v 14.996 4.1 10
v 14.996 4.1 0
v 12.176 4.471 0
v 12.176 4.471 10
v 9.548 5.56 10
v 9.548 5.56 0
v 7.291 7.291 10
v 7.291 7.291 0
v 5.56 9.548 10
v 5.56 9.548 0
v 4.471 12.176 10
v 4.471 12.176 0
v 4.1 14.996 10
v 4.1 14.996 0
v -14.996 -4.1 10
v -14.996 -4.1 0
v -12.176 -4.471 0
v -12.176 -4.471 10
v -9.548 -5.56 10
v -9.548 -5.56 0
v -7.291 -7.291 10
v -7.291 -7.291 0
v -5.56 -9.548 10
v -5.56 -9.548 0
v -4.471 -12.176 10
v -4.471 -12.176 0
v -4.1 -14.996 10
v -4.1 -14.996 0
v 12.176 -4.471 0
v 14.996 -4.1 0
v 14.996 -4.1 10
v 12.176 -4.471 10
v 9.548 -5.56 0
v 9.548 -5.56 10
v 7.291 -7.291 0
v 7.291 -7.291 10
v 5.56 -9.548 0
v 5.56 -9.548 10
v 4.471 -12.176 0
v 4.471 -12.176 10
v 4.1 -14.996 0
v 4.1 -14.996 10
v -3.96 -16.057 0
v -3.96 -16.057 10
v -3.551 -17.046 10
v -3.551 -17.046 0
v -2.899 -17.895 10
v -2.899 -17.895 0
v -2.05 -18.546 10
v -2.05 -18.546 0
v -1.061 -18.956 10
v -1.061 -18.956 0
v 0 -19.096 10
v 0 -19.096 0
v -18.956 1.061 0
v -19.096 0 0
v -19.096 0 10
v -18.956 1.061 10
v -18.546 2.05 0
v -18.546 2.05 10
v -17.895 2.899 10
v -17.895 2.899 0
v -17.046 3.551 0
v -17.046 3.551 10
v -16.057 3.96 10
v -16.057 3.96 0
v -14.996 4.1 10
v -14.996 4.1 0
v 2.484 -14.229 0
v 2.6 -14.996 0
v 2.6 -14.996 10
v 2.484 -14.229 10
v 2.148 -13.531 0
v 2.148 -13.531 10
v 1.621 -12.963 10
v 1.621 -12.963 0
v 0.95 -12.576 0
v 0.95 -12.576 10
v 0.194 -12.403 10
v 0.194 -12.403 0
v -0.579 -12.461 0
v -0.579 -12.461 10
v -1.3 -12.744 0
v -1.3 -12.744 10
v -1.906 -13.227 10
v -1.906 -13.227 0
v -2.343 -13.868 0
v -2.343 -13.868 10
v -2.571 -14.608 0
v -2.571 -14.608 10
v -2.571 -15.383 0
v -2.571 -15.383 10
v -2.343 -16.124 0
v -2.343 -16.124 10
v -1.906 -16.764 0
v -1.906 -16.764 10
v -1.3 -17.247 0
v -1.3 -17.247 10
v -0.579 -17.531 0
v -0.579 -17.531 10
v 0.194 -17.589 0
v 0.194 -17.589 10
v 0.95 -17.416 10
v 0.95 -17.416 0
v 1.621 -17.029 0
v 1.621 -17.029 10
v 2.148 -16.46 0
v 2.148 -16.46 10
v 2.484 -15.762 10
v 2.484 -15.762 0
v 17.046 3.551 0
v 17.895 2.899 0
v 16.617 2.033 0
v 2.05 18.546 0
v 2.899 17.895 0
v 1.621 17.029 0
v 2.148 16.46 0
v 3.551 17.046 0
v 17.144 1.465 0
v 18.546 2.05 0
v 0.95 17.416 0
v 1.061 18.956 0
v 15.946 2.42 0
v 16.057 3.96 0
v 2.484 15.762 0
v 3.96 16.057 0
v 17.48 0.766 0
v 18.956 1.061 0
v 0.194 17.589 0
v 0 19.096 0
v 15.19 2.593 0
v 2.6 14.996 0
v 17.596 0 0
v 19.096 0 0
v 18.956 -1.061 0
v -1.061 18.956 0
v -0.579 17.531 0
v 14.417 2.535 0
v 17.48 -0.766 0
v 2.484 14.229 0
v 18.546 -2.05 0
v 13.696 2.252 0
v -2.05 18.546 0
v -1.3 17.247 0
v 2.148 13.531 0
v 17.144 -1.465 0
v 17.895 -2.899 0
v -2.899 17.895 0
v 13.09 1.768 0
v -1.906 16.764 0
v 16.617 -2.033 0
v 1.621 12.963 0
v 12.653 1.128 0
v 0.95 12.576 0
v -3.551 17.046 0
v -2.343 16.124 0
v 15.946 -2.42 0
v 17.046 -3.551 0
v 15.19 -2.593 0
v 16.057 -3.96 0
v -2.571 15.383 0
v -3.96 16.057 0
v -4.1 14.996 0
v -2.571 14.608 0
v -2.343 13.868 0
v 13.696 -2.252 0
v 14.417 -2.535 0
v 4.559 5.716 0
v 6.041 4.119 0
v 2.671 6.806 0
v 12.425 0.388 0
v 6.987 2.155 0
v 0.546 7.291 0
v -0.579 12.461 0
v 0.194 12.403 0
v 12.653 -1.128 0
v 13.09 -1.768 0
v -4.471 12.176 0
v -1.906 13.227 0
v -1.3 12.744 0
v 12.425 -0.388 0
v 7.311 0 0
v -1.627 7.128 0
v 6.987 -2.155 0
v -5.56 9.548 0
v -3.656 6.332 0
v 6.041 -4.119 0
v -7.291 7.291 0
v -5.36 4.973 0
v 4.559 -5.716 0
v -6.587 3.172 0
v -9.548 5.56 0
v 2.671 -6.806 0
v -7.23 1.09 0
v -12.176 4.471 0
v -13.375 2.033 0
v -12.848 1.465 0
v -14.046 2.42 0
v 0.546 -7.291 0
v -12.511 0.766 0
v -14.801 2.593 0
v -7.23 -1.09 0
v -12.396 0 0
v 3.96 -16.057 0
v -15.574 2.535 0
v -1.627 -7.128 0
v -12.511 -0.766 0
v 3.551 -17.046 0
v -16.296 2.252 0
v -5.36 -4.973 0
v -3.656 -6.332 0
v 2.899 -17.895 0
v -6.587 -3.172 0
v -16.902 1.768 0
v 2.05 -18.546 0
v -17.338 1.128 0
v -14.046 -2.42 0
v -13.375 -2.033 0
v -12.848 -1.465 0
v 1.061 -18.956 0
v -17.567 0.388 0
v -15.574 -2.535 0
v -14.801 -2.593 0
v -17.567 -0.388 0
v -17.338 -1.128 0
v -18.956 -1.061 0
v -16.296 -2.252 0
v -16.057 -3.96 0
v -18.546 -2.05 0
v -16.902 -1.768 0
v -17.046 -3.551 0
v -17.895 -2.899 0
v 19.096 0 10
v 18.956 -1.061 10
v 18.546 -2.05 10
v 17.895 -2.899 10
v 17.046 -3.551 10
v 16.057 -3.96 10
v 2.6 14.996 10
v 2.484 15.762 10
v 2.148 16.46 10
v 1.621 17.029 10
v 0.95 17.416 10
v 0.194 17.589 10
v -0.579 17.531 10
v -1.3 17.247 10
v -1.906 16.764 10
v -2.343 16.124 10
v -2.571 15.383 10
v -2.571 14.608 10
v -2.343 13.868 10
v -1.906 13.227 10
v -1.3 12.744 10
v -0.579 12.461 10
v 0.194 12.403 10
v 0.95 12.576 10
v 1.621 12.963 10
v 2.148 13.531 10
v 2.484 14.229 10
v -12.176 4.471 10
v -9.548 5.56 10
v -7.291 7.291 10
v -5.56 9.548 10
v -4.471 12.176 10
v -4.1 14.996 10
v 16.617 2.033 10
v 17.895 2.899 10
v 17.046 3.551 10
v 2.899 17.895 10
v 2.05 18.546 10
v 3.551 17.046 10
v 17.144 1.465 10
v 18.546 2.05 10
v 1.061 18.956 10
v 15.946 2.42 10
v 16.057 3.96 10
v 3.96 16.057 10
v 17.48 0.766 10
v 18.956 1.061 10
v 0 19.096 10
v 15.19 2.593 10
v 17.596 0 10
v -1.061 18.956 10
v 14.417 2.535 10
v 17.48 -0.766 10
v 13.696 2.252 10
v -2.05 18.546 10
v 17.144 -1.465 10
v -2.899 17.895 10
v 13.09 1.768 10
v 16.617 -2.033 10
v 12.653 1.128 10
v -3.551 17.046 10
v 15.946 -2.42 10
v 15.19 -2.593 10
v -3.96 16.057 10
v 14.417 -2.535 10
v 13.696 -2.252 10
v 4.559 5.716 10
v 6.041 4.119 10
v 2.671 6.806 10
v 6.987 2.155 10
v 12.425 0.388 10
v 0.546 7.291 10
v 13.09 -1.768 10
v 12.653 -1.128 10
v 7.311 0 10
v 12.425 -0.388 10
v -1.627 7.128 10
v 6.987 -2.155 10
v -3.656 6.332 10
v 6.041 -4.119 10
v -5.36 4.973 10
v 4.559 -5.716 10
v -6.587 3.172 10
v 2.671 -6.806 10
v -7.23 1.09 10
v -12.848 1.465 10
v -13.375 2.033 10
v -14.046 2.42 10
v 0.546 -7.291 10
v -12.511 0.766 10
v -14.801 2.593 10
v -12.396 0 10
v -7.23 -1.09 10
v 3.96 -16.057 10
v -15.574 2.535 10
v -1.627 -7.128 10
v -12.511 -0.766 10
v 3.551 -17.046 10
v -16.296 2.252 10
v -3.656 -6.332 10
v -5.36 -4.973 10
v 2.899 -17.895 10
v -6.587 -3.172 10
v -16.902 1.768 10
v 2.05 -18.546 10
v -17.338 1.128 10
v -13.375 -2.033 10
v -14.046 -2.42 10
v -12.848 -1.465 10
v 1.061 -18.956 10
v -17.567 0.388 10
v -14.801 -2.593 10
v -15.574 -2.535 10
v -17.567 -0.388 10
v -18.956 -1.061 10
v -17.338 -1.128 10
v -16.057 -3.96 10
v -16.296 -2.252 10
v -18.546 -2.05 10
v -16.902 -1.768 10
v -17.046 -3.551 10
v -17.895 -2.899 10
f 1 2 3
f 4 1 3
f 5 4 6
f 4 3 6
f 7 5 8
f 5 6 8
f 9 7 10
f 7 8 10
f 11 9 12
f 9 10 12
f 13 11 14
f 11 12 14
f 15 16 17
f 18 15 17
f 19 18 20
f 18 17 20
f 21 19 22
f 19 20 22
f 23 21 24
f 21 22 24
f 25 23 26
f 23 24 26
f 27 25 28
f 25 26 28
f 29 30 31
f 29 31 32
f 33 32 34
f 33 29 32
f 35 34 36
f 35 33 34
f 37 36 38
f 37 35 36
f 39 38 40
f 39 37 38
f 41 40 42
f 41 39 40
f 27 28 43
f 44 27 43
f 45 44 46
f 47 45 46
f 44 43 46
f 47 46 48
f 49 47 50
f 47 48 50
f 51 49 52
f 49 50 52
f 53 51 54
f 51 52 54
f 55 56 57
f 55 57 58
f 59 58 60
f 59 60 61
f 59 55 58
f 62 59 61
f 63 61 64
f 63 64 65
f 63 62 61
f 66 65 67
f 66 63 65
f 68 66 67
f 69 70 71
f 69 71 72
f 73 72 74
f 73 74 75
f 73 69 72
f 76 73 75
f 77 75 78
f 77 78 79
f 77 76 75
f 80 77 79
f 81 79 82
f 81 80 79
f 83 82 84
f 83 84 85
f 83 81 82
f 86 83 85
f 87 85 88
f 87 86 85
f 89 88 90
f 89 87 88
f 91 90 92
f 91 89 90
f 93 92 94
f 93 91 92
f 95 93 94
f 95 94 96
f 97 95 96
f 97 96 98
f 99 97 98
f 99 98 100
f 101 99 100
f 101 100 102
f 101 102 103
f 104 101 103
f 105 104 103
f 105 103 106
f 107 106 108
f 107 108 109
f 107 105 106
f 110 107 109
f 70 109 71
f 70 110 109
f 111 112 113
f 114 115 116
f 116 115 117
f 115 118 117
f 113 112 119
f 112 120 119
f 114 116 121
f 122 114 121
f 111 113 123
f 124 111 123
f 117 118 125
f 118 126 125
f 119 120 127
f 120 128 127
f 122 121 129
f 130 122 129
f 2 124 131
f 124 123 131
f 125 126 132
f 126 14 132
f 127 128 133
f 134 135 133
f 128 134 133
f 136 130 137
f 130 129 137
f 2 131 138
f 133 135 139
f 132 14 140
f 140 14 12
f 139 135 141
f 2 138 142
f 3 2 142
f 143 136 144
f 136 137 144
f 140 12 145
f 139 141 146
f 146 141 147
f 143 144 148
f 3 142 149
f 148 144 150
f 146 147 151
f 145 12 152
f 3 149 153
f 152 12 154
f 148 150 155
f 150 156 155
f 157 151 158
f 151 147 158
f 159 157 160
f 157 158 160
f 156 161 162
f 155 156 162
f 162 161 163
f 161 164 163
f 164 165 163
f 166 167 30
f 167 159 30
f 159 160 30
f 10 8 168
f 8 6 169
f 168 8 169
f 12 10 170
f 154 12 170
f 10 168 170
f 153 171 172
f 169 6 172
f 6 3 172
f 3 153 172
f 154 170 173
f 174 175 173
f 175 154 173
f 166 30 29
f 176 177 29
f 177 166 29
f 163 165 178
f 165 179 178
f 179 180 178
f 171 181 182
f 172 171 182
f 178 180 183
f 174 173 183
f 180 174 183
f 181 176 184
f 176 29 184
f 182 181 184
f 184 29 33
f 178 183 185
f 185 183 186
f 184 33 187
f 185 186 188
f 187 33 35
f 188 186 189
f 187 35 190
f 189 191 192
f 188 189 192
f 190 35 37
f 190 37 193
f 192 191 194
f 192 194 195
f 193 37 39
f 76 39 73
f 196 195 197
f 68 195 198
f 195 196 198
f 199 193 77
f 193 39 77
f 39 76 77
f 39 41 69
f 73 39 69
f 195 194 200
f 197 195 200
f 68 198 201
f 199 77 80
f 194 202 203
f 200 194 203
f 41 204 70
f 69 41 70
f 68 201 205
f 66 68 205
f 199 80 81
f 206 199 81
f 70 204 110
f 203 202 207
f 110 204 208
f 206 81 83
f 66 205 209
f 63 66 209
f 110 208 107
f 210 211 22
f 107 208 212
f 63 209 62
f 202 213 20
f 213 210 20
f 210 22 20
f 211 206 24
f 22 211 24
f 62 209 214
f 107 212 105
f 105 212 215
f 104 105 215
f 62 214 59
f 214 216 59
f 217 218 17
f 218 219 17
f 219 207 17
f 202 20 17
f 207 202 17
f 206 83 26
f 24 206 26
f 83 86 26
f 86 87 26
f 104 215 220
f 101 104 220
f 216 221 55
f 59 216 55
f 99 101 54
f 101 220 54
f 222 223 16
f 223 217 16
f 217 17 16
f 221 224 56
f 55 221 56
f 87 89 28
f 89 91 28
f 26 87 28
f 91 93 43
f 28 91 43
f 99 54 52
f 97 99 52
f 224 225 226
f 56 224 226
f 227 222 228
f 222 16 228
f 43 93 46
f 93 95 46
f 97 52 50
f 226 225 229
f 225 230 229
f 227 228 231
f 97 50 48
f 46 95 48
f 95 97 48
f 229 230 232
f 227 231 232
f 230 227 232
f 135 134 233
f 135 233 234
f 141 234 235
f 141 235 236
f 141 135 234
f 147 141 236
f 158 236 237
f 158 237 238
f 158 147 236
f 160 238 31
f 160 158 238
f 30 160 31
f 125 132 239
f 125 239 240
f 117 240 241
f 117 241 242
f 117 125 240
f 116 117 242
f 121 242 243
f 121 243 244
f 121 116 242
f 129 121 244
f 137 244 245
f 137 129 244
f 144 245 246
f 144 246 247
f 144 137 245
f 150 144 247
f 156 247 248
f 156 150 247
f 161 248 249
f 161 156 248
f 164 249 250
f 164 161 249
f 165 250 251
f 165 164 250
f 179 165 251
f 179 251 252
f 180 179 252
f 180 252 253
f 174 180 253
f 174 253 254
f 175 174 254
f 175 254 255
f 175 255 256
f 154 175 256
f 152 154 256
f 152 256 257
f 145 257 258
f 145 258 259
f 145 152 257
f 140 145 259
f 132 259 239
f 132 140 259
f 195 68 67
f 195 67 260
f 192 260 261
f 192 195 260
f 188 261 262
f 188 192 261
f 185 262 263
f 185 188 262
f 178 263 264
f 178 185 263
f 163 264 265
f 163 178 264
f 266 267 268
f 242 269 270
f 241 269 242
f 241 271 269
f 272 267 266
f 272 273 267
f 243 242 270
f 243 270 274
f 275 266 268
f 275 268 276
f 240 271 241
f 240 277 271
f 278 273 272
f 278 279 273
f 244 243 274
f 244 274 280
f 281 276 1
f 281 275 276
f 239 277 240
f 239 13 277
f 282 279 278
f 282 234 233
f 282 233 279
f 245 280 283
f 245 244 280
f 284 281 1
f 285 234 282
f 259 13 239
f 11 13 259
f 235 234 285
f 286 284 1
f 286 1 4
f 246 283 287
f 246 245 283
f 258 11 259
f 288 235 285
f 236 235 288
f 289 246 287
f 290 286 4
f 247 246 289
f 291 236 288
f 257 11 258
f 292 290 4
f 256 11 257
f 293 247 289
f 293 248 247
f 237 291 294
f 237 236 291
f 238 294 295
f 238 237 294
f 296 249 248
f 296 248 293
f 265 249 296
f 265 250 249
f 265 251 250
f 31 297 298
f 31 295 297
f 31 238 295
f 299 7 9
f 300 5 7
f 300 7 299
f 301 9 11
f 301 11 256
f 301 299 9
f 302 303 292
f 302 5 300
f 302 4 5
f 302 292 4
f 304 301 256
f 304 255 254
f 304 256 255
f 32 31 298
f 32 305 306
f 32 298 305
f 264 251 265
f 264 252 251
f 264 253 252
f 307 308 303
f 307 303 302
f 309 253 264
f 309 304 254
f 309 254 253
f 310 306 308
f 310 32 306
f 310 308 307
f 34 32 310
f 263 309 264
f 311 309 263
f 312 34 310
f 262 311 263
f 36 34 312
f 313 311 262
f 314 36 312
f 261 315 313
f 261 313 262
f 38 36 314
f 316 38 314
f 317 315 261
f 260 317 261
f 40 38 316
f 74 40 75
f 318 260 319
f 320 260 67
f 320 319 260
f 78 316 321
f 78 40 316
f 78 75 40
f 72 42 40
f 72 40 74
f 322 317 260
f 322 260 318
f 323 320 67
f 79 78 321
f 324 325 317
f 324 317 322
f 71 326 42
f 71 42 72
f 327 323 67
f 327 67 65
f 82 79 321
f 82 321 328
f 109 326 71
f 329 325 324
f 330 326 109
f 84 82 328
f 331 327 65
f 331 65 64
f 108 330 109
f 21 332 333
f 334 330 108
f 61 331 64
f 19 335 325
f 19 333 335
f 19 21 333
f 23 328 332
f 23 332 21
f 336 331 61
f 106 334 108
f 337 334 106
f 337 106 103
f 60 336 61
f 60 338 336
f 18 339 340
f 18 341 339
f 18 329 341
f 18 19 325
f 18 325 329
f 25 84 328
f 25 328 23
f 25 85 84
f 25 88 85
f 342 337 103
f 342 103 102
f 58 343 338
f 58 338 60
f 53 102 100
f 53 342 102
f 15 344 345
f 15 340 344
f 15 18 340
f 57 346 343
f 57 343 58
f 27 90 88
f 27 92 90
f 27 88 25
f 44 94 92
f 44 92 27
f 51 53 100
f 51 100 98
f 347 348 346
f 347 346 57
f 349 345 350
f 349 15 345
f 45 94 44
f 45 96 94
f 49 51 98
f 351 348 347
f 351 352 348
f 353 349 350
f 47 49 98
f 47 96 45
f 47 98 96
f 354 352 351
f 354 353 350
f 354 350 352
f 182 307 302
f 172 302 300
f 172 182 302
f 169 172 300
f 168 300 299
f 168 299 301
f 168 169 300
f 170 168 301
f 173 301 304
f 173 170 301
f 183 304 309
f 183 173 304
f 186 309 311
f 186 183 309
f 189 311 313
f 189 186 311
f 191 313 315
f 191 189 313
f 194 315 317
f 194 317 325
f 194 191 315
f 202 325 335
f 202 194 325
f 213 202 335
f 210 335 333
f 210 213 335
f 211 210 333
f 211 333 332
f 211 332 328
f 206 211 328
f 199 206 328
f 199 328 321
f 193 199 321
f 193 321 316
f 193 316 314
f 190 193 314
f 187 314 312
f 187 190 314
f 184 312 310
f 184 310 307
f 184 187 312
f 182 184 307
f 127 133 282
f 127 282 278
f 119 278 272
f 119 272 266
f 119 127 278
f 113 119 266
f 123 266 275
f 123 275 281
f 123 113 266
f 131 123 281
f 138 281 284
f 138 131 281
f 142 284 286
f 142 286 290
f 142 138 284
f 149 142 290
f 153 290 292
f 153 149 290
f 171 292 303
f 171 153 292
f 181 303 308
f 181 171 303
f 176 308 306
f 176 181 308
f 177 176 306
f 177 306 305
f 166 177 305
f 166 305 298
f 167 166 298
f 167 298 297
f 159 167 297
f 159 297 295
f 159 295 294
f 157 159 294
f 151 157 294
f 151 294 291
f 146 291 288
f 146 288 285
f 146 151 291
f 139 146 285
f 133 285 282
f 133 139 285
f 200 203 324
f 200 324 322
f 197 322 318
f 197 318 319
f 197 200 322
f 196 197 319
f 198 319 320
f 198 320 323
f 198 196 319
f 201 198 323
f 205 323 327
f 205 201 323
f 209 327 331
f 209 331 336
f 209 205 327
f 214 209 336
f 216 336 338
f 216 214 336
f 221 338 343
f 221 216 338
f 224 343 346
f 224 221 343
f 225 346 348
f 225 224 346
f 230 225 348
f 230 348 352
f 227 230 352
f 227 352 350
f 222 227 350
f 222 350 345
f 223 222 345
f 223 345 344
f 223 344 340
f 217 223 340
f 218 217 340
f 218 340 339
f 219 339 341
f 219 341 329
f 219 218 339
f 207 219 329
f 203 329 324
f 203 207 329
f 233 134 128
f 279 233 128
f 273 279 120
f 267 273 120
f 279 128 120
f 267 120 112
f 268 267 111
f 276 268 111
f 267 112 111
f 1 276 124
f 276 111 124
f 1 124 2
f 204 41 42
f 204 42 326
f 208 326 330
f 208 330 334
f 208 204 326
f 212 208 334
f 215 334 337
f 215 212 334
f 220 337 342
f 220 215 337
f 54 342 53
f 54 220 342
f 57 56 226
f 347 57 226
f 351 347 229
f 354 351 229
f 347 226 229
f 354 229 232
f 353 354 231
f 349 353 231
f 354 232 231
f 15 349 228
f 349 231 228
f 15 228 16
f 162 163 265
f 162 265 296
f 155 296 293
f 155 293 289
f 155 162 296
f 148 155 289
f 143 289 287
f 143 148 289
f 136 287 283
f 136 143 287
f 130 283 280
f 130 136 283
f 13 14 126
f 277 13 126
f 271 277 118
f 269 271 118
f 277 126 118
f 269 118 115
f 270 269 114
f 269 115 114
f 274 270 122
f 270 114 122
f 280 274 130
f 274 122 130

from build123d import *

# Parameters (mm, degrees)
AUFSATZ_LINEAR_AUSTRAGEN1_DEPTH = 10
SKIZZE2_R                       = 2.6
SCHNITT_LINEAR_AUSTRAGEN2_DEPTH = 10
SKIZZE3_R                       = 7.311453451
SCHNITT_LINEAR_AUSTRAGEN4_DEPTH = 10


with BuildPart() as part:
    # Skizze1 → Aufsatz-Linear austragen1 (new body)
    with BuildSketch(Plane.XY):
        with BuildLine():
            Line((0, 19.095775163), (0, 0))
            Line((0, 0), (19.095775163, 0))
            ThreePointArc((19.095775163, 0), (17.894912966, 2.899137803), (14.995775163, 4.1))
            ThreePointArc((14.995775163, 4.1), (7.291298659, 7.291298659), (4.1, 14.995775163))
            ThreePointArc((4.1, 14.995775163), (2.899137803, 17.894912966), (0, 19.095775163))
        make_face()
    extrude(amount=AUFSATZ_LINEAR_AUSTRAGEN1_DEPTH)

    # Spiegeln1: part across plane


with BuildPart() as part_1:
    add(part.part)
    add(part.part.mirror(Plane.ZX))

    # Spiegeln2: part across plane


with BuildPart() as part_2:
    add(part_1.part)
    add(part_1.part.mirror(Plane(origin=(0, 0, 0), x_dir=(0, 0, 1), z_dir=(1, 0, 0))))

    # Skizze2 → Schnitt-Linear austragen2 (cut)
    with BuildSketch(Plane.XY):
        with Locations((0, 14.995775163)):
            Circle(SKIZZE2_R)
        with Locations((14.995775163, 0)):
            Circle(SKIZZE2_R)
        with Locations((0, -14.995775163)):
            Circle(SKIZZE2_R)
        with Locations((-14.995775163, 0)):
            Circle(SKIZZE2_R)
    extrude(amount=SCHNITT_LINEAR_AUSTRAGEN2_DEPTH, mode=Mode.SUBTRACT)

    # Skizze3 → Schnitt-Linear austragen4 (cut)
    with BuildSketch(Plane.XY):
        Circle(SKIZZE3_R)
    extrude(amount=SCHNITT_LINEAR_AUSTRAGEN4_DEPTH, mode=Mode.SUBTRACT)


solid = part_2.part
